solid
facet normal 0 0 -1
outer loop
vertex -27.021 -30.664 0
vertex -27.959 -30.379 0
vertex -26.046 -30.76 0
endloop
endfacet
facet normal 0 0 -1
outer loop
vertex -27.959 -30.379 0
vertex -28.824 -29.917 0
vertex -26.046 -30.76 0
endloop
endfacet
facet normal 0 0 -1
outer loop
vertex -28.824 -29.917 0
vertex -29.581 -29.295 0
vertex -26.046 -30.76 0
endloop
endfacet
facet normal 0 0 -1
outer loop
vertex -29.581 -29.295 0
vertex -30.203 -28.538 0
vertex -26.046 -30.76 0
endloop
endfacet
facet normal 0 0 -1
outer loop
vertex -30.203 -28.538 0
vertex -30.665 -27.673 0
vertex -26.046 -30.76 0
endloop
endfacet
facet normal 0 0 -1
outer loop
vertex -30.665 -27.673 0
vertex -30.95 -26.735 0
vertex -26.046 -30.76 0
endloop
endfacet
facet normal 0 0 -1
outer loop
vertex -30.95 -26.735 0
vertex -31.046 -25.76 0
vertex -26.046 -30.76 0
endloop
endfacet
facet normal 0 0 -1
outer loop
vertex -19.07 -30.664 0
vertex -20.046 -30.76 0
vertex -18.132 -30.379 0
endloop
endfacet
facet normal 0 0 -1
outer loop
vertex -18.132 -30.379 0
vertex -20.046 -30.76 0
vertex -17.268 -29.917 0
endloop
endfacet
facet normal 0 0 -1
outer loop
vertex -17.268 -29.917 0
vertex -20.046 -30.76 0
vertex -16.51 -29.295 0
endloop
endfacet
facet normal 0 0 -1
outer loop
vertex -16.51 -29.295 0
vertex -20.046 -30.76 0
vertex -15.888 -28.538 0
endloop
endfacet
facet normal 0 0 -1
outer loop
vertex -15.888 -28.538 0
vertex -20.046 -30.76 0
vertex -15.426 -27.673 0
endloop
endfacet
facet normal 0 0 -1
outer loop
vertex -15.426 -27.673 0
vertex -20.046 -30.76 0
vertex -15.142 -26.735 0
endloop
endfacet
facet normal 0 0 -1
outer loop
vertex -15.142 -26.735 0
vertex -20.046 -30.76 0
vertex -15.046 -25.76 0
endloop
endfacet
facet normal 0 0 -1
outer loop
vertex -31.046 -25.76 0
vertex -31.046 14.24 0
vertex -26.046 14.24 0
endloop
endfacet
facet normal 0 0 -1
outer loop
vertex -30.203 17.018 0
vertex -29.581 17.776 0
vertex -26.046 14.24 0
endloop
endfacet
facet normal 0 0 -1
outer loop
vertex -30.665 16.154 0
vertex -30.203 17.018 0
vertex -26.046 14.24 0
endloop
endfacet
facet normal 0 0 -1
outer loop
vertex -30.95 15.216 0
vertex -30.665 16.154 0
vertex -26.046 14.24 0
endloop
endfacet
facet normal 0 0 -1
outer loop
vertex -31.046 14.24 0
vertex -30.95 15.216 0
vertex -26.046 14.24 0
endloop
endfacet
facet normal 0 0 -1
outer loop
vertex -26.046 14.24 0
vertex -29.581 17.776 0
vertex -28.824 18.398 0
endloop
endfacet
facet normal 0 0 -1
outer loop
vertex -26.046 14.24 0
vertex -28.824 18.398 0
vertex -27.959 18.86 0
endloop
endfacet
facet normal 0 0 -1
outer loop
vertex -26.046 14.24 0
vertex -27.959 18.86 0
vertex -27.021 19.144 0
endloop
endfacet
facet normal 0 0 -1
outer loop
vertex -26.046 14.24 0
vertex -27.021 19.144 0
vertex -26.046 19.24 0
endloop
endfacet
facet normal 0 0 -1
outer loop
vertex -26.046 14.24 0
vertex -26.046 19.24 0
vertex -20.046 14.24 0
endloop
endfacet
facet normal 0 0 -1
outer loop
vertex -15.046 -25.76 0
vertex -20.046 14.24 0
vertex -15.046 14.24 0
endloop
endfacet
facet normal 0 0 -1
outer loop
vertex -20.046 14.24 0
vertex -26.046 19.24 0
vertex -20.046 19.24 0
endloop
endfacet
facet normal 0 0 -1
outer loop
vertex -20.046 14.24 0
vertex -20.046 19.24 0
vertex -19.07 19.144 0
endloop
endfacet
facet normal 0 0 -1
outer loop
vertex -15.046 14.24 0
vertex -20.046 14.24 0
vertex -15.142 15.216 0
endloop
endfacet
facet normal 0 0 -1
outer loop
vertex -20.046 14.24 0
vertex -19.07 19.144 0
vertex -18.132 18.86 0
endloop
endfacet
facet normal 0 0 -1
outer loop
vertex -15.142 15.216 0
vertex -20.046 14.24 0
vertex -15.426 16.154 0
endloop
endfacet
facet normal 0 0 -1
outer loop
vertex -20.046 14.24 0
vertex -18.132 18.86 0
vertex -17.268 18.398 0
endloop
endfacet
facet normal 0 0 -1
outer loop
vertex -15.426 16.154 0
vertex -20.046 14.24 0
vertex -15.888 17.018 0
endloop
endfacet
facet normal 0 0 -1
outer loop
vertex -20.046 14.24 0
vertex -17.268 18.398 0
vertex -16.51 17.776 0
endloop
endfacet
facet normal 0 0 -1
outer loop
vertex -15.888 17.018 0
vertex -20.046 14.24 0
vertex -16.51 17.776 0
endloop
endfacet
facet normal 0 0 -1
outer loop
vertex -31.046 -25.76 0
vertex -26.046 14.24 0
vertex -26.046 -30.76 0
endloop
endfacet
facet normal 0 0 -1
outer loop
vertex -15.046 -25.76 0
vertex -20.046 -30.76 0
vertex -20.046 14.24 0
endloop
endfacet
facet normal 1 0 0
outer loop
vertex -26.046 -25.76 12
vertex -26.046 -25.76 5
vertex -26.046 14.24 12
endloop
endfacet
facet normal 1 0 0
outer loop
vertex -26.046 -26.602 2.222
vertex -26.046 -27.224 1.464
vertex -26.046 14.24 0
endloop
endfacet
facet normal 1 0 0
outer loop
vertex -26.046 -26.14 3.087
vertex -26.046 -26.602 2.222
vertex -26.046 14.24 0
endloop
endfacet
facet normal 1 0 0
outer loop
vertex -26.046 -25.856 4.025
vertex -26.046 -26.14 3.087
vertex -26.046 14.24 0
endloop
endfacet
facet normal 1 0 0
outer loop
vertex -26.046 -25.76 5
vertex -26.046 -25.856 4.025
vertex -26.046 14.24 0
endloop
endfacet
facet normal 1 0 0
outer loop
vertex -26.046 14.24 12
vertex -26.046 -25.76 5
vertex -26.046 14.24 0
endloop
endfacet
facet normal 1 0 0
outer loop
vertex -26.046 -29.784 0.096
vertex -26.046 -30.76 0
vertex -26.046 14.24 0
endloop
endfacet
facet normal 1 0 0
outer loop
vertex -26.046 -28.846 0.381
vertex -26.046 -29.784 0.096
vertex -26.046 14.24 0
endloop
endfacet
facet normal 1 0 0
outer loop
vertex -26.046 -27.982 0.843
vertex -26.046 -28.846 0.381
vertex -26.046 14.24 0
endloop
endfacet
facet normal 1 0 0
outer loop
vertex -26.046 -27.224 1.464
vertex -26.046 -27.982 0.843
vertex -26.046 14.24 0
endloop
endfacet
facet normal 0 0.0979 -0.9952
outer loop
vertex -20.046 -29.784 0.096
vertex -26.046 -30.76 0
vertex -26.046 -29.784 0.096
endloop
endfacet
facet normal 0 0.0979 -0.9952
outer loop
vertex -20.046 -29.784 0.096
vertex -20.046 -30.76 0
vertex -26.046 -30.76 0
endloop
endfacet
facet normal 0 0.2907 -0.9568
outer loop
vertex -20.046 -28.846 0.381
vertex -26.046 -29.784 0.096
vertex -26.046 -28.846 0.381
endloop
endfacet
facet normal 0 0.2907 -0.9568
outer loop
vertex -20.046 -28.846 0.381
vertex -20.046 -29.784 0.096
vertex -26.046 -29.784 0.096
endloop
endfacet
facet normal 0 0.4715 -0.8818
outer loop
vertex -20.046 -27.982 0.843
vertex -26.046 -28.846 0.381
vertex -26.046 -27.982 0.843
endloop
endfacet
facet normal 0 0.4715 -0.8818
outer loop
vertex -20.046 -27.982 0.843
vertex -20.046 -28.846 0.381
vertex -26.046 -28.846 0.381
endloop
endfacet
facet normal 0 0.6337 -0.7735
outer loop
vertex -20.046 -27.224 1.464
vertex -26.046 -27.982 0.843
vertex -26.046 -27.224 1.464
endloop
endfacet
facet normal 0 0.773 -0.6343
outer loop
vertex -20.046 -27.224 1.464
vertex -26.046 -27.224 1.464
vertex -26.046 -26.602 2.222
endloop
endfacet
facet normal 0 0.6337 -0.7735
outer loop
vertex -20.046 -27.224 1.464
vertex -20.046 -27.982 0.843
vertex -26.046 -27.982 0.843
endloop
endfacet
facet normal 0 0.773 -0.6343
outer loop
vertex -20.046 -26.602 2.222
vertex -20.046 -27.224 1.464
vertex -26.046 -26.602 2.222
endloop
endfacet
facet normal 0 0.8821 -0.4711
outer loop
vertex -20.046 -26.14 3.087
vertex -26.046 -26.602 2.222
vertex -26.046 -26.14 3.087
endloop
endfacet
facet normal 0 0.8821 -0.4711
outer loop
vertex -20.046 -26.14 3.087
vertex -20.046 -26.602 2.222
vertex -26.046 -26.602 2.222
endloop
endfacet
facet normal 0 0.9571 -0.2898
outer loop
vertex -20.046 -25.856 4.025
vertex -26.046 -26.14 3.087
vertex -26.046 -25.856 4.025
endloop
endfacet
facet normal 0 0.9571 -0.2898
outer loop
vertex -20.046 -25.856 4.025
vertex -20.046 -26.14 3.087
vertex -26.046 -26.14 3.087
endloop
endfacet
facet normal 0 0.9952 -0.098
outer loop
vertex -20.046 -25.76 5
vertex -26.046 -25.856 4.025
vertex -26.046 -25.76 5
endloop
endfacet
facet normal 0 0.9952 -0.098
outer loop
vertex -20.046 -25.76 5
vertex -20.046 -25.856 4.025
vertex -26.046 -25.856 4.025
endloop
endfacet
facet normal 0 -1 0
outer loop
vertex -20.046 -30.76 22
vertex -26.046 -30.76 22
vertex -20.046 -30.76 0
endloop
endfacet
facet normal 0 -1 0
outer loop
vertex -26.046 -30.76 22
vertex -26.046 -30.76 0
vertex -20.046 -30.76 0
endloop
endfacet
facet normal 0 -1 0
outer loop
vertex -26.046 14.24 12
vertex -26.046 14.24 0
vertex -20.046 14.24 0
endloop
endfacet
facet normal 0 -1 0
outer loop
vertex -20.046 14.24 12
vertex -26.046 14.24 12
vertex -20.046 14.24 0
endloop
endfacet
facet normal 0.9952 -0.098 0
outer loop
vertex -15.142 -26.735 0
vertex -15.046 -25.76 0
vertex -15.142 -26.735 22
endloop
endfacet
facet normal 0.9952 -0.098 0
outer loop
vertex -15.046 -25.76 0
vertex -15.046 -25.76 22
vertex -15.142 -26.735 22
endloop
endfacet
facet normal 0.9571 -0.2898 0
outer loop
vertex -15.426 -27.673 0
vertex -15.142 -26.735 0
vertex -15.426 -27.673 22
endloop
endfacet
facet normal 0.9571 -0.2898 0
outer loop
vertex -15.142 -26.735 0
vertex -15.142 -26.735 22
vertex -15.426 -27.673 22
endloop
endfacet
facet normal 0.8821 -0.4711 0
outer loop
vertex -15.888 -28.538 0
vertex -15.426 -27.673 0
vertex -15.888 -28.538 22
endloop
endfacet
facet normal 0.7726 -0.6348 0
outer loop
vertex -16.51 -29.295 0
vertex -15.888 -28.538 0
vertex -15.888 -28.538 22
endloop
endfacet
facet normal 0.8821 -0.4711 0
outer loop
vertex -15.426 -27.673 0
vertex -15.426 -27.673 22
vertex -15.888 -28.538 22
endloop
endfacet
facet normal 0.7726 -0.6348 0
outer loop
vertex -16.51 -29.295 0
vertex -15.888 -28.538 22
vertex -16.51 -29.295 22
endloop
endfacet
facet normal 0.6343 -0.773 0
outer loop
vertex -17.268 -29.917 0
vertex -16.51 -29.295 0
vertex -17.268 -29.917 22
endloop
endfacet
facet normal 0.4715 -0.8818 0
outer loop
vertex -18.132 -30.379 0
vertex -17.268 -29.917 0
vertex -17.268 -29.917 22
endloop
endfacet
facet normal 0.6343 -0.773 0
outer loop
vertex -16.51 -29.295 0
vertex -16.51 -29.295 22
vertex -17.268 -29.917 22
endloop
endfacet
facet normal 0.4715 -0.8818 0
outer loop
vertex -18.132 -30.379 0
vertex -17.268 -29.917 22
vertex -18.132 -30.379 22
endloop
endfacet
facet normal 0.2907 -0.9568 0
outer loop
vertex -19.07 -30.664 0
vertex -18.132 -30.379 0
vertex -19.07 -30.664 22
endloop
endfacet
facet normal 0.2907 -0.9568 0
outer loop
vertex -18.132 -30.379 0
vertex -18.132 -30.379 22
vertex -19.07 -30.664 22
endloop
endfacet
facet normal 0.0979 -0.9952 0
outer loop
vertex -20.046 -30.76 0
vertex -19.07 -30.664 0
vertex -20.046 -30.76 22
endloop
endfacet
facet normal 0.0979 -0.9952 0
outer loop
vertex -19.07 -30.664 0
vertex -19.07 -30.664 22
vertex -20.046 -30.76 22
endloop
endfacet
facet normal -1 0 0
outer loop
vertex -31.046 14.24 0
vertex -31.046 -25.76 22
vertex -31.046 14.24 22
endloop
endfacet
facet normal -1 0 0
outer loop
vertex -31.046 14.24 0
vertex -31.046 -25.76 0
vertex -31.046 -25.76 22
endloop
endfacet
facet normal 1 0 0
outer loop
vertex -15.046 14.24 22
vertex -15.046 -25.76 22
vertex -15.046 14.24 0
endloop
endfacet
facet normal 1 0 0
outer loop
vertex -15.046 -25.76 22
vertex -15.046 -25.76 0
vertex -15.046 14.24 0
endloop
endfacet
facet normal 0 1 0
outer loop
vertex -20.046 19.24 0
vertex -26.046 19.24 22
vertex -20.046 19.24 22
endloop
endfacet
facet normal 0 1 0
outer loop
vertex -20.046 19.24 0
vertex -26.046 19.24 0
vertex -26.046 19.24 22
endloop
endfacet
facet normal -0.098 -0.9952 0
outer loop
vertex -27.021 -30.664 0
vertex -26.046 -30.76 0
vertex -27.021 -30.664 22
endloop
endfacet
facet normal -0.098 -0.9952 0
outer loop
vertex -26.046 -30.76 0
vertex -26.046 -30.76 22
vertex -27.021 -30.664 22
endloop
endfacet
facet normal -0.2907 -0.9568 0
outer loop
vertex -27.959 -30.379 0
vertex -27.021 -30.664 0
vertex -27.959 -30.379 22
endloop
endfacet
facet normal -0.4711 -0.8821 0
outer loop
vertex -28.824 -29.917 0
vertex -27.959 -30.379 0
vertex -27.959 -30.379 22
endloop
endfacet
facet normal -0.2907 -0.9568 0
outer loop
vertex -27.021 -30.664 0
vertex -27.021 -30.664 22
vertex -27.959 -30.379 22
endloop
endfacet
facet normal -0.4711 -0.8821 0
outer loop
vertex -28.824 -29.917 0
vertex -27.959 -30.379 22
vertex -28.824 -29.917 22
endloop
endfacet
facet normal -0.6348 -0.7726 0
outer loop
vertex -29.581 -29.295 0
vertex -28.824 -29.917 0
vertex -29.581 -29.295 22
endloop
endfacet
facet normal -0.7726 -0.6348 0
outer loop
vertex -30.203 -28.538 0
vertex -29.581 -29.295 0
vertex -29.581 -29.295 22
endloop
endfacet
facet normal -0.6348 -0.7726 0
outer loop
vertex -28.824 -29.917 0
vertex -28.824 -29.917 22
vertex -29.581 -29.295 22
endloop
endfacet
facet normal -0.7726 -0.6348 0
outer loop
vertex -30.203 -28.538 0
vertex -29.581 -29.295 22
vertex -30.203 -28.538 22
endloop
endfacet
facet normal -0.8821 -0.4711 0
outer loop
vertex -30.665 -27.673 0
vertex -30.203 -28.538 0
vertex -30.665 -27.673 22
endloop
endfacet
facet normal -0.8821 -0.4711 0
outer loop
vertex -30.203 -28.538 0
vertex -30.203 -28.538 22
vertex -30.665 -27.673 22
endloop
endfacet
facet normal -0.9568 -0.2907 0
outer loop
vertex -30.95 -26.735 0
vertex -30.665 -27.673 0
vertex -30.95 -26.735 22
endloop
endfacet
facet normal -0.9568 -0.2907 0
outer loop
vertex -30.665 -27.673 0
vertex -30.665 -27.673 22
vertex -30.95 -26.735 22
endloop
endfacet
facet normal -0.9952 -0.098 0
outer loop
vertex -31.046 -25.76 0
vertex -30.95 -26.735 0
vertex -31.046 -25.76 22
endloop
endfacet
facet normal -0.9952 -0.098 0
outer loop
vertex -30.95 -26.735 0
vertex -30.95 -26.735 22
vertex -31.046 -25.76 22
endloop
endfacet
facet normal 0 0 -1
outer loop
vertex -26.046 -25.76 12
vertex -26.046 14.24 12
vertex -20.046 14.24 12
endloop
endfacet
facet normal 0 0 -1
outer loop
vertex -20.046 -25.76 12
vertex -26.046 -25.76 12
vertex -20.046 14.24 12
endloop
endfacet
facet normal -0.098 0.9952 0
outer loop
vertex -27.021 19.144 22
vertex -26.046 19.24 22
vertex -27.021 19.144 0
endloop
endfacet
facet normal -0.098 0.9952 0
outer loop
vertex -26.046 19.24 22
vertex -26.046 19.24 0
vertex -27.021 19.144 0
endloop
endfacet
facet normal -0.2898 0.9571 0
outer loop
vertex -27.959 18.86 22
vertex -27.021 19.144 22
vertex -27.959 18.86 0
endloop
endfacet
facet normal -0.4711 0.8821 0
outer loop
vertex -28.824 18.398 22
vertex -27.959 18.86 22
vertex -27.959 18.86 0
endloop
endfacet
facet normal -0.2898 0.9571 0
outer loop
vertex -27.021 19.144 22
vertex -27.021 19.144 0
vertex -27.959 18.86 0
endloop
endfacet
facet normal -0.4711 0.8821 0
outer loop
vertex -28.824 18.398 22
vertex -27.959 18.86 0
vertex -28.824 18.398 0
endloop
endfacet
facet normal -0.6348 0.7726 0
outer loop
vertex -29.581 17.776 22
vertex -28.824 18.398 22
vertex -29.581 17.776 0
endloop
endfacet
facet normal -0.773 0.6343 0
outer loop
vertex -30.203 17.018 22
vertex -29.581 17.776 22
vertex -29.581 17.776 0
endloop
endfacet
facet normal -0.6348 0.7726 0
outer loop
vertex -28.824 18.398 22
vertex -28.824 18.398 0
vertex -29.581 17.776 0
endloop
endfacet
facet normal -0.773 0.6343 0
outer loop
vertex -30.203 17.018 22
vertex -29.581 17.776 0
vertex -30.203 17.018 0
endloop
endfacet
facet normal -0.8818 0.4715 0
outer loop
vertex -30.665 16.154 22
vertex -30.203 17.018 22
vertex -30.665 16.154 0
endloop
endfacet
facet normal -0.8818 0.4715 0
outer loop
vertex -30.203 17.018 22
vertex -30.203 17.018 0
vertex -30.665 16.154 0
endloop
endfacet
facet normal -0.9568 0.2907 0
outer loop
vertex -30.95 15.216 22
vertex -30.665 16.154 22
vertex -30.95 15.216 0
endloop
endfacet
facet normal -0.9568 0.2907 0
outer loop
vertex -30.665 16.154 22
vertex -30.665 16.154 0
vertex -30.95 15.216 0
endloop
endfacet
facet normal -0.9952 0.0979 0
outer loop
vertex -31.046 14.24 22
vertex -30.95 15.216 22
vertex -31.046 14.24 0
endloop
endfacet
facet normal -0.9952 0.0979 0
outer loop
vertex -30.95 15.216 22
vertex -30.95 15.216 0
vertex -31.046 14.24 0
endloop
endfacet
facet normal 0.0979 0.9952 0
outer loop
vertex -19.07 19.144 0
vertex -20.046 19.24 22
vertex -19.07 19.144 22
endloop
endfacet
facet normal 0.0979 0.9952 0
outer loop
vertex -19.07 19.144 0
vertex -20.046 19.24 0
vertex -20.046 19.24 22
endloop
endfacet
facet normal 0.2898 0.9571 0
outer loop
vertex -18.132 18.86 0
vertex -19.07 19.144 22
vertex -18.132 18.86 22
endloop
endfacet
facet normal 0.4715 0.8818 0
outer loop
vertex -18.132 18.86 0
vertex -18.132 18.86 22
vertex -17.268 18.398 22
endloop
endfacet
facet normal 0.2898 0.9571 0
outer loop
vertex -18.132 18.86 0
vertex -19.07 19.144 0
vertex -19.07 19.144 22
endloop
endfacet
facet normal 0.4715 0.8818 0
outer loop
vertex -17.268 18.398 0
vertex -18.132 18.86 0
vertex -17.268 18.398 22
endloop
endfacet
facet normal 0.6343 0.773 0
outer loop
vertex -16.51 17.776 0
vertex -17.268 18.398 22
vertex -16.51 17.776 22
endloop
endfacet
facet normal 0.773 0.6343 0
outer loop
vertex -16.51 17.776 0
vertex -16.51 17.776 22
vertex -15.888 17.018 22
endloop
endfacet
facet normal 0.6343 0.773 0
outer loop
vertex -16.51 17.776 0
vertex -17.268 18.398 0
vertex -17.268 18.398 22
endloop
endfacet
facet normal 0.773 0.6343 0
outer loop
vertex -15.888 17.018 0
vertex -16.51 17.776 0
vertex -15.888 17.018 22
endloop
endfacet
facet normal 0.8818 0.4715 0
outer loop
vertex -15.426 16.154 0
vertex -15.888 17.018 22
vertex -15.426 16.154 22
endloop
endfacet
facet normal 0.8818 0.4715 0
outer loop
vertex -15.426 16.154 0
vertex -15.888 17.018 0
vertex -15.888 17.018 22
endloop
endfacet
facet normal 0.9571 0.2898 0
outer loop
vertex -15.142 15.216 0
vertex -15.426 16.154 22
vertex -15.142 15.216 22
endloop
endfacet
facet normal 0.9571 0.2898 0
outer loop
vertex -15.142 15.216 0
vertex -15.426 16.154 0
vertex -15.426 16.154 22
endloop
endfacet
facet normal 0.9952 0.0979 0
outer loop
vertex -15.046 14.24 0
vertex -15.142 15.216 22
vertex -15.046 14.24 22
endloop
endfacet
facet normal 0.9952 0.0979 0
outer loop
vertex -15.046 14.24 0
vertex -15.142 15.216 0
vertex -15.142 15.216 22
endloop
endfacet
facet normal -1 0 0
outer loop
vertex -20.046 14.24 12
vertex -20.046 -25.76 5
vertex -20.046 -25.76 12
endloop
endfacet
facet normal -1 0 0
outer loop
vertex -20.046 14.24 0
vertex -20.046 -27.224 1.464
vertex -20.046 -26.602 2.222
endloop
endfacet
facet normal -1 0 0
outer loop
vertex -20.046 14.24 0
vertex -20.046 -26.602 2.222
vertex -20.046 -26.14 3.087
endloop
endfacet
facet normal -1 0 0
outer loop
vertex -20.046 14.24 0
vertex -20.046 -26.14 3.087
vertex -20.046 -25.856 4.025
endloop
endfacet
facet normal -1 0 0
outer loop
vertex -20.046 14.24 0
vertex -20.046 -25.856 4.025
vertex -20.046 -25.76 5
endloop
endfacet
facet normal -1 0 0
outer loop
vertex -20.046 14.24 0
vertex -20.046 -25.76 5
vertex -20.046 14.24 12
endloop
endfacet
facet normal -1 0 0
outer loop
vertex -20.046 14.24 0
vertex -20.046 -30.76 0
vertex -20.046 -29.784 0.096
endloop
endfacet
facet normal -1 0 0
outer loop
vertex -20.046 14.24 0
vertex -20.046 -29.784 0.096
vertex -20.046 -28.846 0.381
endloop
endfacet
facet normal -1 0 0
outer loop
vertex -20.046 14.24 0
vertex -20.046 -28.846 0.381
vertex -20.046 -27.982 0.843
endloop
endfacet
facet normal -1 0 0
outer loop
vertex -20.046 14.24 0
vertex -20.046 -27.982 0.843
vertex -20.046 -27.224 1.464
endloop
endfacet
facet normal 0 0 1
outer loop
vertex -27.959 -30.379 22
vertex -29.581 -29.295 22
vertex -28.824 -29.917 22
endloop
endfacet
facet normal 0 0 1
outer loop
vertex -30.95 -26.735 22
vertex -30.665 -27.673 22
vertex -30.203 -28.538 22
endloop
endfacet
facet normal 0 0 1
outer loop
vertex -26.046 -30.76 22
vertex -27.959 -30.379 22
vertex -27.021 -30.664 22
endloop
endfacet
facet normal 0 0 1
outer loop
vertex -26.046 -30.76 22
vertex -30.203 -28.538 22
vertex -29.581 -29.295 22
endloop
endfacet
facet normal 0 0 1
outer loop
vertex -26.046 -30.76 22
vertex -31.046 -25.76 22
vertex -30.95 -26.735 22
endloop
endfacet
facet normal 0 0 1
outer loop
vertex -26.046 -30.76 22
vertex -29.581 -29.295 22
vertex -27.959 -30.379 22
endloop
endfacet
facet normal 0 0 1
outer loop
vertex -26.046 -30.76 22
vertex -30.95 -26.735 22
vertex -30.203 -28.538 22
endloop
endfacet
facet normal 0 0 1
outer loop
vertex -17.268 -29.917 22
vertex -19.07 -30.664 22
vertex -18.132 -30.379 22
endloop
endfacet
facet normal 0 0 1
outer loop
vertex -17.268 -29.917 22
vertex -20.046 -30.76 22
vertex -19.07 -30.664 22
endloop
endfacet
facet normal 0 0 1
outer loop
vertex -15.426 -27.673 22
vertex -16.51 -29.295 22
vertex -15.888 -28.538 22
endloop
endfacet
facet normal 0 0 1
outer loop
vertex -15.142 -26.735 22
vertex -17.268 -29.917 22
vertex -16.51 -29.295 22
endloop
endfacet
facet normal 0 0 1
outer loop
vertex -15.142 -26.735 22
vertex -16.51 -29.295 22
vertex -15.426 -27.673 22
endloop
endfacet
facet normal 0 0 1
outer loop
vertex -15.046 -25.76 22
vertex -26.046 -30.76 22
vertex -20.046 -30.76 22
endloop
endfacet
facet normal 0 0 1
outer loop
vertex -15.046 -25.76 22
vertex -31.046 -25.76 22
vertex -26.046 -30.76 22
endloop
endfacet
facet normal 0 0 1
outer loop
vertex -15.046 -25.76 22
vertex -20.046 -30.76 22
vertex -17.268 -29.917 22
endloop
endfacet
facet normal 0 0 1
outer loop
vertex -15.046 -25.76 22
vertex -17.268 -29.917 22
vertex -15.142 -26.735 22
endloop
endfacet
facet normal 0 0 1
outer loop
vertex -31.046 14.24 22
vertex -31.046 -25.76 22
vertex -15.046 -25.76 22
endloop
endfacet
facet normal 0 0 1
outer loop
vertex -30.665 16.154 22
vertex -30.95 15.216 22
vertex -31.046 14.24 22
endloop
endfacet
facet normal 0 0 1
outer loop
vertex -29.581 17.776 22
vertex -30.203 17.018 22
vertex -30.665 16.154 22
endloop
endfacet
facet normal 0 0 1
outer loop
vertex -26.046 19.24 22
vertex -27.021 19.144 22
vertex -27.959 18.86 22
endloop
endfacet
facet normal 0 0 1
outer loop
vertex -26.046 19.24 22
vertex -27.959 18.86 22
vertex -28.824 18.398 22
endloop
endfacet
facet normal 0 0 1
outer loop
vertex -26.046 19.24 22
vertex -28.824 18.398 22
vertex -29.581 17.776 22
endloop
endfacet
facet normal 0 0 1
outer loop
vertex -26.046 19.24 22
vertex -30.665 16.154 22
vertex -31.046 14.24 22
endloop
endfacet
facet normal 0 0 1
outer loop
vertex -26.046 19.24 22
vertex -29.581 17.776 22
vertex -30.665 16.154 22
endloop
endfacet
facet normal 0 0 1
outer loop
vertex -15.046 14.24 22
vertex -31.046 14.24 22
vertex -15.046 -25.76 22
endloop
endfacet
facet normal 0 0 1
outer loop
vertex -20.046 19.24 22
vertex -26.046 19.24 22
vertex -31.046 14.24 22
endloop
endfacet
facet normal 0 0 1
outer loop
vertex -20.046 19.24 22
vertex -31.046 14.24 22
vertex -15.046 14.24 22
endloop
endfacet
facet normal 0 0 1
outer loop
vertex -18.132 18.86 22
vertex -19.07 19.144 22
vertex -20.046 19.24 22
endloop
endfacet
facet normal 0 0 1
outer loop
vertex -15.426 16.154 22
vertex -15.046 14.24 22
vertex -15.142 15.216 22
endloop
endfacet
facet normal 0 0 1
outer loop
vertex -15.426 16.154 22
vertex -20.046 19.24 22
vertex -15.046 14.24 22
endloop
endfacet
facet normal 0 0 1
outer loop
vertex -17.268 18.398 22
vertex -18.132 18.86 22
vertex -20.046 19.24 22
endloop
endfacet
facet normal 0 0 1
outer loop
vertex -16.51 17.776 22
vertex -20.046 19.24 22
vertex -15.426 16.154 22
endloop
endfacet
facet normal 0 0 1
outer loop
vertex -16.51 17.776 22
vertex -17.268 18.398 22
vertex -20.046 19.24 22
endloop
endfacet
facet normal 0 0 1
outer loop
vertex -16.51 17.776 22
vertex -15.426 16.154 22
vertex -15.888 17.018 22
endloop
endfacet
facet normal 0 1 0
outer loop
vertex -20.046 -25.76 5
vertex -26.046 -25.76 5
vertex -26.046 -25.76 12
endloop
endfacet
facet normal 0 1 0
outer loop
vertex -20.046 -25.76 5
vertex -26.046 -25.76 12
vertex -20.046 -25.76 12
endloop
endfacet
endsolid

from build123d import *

# Parameters (mm, degrees)
F0_W     = 16
F0_H     = 50
F0_W_2   = 6
F0_H_2   = 40
F1_DEPTH = 12
F2_W     = 16
F2_H     = 50
F3_DEPTH = 10
F4_R     = 4.99999
F5_R     = 5


# Not quite as in the source:
# - a fillet or chamfer is up to 0.001 mm smaller than in the source, because OpenCascade refuses the exact size


with BuildPart() as f1:
    # F0 (on Top) → F1 (new body)
    with BuildSketch(Plane.XY):
        with Locations((-23.0457014143, -5.7597834617)):
            Rectangle(F0_W, F0_H)
        with Locations((-23.0457014143, -5.7597834617)):
            Rectangle(F0_W_2, F0_H_2, mode=Mode.SUBTRACT)
    extrude(amount=F1_DEPTH)

    # F2 (on face) → F3 (join)
    with BuildSketch(Plane.XY.offset(12)):
        with Locations((-23.0457014143, -5.7597834617)):
            Rectangle(F2_W, F2_H)
    extrude(amount=F3_DEPTH)

    # F4 (radius 5 in the source; OpenCascade refuses exactly that, so slightly less here)
    f4_edges = [f1.edges().sort_by_distance(p)[0] for p in [
        (-23.045701, -25.759783, 0),
    ]]
    fillet(f4_edges, radius=F4_R)

    # F5
    f5_edges = [f1.edges().sort_by_distance(p)[0] for p in [
        (-15.045701, 19.240217, 11),
        (-15.045701, -30.759783, 11),
        (-31.045701, -30.759783, 11),
        (-31.045701, 19.240217, 11),
    ]]
    fillet(f5_edges, radius=F5_R)


solid = f1.part
